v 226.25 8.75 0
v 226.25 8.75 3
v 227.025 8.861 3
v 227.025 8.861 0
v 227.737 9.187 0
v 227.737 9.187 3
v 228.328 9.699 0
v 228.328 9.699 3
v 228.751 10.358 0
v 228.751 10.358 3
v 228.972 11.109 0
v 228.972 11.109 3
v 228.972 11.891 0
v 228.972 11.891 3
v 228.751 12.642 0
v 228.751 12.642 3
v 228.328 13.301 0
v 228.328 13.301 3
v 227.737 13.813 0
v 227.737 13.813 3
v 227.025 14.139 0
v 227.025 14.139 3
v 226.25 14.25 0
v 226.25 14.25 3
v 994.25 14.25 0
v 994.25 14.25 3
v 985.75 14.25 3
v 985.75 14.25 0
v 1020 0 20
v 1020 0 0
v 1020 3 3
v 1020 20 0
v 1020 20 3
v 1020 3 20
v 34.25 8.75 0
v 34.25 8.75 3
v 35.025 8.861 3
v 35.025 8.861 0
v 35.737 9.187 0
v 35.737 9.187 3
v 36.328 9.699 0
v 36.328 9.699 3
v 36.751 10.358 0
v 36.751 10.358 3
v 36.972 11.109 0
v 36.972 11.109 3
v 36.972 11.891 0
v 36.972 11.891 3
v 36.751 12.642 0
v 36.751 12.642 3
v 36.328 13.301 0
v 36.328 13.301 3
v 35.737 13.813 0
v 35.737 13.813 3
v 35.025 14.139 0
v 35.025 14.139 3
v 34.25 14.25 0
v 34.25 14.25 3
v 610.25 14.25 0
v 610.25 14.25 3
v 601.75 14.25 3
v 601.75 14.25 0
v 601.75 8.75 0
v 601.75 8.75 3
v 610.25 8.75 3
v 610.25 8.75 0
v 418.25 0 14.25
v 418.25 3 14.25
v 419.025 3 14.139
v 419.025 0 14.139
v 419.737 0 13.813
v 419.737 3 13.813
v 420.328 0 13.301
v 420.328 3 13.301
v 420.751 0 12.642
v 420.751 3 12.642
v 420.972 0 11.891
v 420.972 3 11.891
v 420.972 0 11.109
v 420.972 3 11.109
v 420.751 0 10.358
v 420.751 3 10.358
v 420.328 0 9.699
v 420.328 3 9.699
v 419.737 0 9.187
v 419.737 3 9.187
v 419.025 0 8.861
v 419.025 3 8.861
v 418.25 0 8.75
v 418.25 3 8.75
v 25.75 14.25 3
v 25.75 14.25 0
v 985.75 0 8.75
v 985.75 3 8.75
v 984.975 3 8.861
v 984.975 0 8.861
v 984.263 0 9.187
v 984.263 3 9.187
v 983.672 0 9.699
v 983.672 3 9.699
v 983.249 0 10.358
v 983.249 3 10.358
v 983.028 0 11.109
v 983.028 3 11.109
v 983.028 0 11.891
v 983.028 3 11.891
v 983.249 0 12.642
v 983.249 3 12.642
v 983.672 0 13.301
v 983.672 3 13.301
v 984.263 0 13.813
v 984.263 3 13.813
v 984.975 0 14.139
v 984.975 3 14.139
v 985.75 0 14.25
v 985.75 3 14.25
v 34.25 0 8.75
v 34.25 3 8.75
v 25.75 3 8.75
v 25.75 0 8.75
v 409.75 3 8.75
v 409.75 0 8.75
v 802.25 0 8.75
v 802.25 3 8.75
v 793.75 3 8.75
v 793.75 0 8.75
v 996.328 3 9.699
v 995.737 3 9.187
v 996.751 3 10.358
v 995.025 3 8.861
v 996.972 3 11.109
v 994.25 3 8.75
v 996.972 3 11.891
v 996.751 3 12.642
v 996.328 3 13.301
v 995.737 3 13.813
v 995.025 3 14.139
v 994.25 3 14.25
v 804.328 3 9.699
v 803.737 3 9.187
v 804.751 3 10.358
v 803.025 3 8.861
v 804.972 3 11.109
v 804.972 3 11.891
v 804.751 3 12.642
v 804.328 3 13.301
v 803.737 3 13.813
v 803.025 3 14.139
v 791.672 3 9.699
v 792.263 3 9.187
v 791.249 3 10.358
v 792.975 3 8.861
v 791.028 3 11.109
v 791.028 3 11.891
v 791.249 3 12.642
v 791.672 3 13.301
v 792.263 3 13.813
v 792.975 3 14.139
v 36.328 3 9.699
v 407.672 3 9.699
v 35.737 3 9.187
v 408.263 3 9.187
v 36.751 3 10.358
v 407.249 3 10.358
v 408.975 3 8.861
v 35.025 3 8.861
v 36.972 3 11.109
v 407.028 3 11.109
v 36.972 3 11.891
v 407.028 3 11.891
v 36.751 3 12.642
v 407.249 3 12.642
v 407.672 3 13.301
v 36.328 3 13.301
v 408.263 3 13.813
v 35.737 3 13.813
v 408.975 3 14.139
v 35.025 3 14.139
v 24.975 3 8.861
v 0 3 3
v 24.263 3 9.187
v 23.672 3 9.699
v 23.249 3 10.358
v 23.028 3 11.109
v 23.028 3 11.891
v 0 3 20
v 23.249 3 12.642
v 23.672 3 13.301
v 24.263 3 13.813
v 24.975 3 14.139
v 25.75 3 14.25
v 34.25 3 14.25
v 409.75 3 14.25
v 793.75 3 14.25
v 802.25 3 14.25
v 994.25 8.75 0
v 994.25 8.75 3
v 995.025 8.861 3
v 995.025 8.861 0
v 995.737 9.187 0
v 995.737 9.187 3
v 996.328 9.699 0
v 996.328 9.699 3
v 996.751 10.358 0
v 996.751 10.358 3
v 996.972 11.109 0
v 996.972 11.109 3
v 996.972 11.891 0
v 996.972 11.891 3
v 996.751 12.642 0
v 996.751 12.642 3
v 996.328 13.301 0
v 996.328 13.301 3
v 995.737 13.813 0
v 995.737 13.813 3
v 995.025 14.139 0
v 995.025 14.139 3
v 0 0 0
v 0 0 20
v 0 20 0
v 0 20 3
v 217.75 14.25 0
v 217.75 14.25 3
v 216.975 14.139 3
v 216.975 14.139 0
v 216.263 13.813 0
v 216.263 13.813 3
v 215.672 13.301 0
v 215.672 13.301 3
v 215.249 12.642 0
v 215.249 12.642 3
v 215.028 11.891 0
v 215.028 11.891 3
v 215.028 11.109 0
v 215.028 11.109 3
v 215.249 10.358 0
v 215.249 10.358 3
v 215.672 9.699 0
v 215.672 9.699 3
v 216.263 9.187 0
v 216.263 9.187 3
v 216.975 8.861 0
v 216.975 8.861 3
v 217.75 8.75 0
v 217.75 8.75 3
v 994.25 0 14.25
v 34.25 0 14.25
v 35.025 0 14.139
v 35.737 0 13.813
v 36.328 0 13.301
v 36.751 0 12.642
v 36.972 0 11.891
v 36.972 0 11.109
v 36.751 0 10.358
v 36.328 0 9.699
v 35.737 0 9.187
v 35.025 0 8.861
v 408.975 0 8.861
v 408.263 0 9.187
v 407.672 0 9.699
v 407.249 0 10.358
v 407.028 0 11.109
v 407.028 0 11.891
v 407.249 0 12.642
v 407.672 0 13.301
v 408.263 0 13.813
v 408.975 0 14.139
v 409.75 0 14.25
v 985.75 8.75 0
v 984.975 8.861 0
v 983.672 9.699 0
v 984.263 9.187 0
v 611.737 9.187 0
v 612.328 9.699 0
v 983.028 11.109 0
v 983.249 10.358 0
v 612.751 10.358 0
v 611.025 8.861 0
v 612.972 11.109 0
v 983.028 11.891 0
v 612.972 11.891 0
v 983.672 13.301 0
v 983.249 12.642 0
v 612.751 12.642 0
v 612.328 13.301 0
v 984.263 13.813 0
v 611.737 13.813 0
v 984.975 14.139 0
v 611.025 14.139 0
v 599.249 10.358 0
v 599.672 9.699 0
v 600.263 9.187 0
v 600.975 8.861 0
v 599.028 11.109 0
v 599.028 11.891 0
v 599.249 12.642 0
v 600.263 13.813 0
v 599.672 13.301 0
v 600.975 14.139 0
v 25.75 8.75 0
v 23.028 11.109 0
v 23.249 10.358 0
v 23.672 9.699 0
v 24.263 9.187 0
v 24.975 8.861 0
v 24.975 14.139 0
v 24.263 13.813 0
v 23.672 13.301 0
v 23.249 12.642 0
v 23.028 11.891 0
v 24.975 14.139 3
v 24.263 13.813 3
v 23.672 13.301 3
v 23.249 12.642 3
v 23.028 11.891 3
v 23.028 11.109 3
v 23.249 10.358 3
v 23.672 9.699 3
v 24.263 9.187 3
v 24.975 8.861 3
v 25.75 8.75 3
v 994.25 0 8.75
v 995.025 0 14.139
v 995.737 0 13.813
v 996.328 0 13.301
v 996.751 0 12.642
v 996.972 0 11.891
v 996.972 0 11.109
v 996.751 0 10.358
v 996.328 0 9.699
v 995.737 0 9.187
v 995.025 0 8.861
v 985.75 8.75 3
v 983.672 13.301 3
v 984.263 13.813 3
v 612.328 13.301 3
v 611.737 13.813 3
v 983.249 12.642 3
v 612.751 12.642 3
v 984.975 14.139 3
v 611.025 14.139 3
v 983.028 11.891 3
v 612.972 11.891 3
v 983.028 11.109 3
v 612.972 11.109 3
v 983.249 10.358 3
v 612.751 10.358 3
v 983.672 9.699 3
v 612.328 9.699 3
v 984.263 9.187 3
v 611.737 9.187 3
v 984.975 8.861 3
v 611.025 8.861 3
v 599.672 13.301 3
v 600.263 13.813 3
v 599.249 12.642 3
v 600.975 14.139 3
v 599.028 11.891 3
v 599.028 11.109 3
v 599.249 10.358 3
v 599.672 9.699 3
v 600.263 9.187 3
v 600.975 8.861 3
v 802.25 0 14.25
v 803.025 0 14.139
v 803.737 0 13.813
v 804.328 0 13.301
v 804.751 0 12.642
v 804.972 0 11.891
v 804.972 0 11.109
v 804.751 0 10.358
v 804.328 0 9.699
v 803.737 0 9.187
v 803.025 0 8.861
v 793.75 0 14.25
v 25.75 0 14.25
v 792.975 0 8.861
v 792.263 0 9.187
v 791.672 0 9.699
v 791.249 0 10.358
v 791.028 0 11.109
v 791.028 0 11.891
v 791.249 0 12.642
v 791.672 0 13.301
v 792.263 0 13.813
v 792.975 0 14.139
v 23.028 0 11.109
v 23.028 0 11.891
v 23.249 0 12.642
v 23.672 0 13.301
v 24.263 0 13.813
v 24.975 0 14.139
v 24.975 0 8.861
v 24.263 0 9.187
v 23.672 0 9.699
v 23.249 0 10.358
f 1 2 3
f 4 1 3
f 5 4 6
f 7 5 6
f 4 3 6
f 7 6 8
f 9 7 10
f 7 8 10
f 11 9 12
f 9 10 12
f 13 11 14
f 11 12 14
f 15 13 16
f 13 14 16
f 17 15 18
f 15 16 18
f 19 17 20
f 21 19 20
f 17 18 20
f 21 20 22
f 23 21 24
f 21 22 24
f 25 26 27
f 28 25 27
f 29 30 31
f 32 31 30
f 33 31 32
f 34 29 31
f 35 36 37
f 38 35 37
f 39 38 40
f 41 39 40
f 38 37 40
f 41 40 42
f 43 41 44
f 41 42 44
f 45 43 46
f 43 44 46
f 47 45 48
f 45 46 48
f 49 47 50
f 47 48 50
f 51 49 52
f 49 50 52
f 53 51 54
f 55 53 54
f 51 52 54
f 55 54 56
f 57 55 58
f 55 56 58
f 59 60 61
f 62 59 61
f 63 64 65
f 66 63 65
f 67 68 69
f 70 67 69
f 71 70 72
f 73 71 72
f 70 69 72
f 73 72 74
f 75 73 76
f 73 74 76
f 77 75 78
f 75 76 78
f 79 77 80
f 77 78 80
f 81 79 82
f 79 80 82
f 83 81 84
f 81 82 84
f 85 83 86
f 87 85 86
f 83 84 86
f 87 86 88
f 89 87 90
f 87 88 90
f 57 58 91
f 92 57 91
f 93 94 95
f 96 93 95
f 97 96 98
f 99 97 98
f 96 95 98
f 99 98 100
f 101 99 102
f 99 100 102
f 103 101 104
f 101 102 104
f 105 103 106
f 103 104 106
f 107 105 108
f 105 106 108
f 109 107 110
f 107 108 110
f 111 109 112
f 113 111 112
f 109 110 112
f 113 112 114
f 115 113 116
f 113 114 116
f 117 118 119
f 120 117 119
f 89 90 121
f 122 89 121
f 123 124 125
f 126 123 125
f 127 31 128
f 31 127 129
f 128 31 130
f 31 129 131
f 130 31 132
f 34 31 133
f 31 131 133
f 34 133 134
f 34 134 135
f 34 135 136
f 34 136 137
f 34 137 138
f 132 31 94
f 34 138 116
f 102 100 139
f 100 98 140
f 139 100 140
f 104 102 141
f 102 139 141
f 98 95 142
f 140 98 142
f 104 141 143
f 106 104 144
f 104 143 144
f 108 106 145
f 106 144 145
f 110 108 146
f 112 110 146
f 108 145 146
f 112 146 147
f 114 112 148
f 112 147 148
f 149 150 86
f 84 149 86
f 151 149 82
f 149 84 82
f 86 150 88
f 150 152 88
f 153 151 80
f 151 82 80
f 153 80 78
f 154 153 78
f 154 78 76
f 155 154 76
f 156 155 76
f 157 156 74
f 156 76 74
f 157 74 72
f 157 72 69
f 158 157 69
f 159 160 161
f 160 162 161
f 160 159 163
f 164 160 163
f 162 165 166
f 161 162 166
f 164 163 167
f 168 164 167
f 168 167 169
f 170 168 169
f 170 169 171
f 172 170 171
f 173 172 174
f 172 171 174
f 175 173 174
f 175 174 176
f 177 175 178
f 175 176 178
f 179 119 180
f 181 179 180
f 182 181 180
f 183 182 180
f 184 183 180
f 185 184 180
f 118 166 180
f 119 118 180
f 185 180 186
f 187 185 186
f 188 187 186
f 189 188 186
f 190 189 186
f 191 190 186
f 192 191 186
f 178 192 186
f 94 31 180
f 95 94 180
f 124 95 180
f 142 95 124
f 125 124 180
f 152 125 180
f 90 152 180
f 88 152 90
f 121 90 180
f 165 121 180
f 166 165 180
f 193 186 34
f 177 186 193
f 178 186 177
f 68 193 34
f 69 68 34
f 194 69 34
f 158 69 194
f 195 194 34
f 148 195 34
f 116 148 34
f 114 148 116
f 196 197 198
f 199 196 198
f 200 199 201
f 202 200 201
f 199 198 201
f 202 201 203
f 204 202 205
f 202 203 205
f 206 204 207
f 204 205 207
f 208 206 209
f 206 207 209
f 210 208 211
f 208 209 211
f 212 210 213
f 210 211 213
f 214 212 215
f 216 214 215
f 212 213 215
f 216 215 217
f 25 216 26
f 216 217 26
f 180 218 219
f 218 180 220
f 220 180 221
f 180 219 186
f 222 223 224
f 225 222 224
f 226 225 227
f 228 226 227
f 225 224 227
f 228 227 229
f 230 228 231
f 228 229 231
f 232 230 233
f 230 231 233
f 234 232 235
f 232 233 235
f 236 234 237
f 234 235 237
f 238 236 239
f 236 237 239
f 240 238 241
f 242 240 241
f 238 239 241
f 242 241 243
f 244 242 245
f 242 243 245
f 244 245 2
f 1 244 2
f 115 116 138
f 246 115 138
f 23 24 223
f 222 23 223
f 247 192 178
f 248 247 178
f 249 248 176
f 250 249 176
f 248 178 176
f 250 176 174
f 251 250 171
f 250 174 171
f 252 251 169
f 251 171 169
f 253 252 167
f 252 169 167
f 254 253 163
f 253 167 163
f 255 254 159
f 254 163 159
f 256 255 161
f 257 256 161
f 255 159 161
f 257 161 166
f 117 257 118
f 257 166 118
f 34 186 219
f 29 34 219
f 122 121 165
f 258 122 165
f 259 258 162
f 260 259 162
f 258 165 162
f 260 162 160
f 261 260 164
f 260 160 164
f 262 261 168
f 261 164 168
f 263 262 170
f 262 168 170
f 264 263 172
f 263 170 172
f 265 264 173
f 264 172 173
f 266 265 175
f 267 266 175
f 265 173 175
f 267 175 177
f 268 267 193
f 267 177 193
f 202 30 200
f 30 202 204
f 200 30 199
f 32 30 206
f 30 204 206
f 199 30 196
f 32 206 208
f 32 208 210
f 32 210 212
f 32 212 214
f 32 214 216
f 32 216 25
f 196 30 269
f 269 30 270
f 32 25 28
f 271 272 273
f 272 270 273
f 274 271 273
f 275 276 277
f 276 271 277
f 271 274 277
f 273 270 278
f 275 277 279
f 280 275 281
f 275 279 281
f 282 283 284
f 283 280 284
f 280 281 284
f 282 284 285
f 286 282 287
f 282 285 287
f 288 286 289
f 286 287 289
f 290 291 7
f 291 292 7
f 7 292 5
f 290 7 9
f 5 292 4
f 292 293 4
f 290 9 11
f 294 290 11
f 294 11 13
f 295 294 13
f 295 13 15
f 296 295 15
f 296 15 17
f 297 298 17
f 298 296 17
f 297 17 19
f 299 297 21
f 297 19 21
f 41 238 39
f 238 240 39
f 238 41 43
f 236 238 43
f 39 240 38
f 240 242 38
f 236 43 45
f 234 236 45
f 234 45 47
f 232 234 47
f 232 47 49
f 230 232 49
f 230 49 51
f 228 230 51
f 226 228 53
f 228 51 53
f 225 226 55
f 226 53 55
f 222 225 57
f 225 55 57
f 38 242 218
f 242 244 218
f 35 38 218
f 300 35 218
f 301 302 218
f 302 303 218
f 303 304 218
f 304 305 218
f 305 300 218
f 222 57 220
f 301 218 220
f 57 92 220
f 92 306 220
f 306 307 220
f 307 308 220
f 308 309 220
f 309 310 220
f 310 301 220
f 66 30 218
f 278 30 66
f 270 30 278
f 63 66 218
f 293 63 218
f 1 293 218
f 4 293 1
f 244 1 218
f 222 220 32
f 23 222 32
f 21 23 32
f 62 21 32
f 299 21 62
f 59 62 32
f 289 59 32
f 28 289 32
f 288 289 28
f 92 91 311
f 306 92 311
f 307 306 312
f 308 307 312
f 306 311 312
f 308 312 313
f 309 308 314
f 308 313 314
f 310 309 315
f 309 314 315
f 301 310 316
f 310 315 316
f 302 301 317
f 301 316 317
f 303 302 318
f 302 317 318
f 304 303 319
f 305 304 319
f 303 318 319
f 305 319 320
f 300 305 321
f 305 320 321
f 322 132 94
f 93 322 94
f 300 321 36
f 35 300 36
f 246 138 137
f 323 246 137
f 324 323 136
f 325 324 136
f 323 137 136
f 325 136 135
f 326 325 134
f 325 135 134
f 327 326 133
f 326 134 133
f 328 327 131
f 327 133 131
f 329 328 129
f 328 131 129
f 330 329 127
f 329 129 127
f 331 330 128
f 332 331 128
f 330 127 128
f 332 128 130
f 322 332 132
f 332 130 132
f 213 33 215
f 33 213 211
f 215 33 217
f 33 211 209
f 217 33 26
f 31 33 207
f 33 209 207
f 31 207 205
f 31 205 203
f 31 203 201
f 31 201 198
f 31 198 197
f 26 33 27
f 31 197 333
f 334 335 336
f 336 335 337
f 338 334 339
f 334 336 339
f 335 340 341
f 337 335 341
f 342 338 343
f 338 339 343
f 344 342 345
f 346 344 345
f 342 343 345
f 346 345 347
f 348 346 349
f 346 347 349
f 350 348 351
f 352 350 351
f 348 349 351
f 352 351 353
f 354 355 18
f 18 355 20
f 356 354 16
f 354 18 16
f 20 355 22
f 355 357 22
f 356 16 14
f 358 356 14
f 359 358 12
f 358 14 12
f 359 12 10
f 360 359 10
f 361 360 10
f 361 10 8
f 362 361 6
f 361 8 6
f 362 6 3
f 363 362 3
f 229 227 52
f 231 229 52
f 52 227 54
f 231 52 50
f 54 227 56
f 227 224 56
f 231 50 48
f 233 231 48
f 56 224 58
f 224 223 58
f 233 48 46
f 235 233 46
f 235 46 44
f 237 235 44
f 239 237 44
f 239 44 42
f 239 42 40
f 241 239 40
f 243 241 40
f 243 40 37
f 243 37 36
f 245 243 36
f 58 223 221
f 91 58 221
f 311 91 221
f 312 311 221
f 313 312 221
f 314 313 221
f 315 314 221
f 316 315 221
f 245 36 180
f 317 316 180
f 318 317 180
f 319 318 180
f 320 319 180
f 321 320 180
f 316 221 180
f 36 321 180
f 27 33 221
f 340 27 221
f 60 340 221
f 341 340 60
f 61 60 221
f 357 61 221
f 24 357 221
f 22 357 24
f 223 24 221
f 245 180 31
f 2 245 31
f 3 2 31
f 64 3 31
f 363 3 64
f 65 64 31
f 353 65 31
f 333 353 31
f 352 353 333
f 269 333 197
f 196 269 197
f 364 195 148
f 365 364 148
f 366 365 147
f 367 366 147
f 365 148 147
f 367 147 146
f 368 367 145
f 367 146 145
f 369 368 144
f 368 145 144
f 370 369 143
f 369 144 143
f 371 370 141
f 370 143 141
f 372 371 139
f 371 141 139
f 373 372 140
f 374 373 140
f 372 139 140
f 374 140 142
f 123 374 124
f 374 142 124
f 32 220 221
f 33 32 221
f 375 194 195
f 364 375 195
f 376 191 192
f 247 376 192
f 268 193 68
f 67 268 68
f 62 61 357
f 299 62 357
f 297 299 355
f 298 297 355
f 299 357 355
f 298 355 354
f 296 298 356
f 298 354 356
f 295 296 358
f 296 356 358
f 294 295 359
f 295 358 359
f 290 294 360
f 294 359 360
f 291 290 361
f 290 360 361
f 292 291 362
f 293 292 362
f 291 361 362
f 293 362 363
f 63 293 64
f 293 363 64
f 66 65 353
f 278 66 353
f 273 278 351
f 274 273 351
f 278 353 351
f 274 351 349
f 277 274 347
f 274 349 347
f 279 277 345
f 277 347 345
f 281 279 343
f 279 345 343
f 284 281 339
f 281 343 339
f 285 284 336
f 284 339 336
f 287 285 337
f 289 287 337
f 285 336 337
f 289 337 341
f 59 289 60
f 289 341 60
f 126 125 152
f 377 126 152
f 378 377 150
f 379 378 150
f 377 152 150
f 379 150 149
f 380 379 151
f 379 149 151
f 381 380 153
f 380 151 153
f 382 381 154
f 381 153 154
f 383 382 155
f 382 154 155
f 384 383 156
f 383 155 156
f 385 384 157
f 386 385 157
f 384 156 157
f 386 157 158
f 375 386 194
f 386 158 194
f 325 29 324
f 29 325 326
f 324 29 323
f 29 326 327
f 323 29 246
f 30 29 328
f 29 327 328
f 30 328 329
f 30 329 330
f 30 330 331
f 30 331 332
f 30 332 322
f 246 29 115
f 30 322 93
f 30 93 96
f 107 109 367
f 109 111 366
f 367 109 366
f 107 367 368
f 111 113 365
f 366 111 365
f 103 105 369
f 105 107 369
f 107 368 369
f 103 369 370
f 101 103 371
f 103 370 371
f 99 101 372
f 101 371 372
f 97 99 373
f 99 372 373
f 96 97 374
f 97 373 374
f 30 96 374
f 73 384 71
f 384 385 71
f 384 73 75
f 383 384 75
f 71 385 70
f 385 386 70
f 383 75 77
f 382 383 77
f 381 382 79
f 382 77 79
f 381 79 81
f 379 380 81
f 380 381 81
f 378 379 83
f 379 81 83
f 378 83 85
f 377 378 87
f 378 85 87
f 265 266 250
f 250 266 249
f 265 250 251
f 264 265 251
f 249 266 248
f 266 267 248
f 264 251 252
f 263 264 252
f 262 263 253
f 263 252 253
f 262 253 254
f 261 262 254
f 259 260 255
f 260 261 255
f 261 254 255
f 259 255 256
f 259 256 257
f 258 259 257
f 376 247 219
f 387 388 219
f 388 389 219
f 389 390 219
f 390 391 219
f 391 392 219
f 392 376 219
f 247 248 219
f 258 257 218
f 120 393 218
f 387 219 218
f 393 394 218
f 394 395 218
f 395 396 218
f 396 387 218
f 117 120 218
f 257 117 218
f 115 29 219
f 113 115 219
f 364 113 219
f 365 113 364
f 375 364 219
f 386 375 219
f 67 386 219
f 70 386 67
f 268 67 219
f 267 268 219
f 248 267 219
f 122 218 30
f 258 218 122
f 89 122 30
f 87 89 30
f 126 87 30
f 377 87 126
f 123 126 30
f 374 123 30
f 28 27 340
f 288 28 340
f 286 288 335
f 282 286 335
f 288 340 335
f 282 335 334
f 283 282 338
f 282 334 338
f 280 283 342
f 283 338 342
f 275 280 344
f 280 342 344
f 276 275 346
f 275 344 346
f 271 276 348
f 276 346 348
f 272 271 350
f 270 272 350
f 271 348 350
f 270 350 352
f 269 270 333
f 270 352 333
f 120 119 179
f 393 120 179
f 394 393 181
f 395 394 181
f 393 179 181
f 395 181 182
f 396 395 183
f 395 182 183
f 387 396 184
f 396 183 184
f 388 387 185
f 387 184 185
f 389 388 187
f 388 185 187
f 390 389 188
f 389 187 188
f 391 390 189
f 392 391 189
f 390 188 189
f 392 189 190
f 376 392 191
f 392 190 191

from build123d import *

# Parameters (mm, degrees)
F1_DEPTH = 1020
F3_DEPTH = 3
F5_DEPTH = 3


with BuildPart() as f1:
    # F0 (on Right) → F1 (new body)
    with BuildSketch(Plane.YZ):
        Polygon((0, 20), (0, 0), (20, 0), (20, 3), (3, 3), (3, 20), align=None)
    extrude(amount=F1_DEPTH)

    # F2 (on face) → F3 (cut)
    with BuildSketch(Plane(origin=(0, 3, 0), x_dir=(-1, 0, 0), z_dir=(0, 1, 0))):
        with BuildLine():
            Line((-985.75, 14.25), (-994.25, 14.25))
            ThreePointArc((-994.25, 14.25), (-997, 11.5), (-994.25, 8.75))
            Line((-994.25, 8.75), (-985.75, 8.75))
            ThreePointArc((-985.75, 8.75), (-983, 11.5), (-985.75, 14.25))
        make_face()
        with BuildLine():
            Line((-25.75, 14.25), (-34.25, 14.25))
            ThreePointArc((-34.25, 14.25), (-37, 11.5), (-34.25, 8.75))
            Line((-34.25, 8.75), (-25.75, 8.75))
            ThreePointArc((-25.75, 8.75), (-23, 11.5), (-25.75, 14.25))
        make_face()
        with BuildLine():
            Line((-793.75, 14.25), (-802.25, 14.25))
            ThreePointArc((-802.25, 14.25), (-805, 11.5), (-802.25, 8.75))
            Line((-802.25, 8.75), (-793.75, 8.75))
            ThreePointArc((-793.75, 8.75), (-791, 11.5), (-793.75, 14.25))
        make_face()
        with BuildLine():
            Line((-409.75, 14.25), (-418.25, 14.25))
            ThreePointArc((-418.25, 14.25), (-421, 11.5), (-418.25, 8.75))
            Line((-418.25, 8.75), (-409.75, 8.75))
            ThreePointArc((-409.75, 8.75), (-407, 11.5), (-409.75, 14.25))
        make_face()
    extrude(amount=-F3_DEPTH, mode=Mode.SUBTRACT)

    # F4 (on face) → F5 (cut)
    with BuildSketch(Plane.XY.offset(3)):
        with BuildLine():
            Line((994.25, 14.25), (985.75, 14.25))
            ThreePointArc((985.75, 14.25), (983, 11.5), (985.75, 8.75))
            Line((985.75, 8.75), (994.25, 8.75))
            ThreePointArc((994.25, 8.75), (997, 11.5), (994.25, 14.25))
        make_face()
        with BuildLine():
            Line((226.25, 14.25), (217.75, 14.25))
            ThreePointArc((217.75, 14.25), (215, 11.5), (217.75, 8.75))
            Line((217.75, 8.75), (226.25, 8.75))
            ThreePointArc((226.25, 8.75), (229, 11.5), (226.25, 14.25))
        make_face()
        with BuildLine():
            Line((34.25, 14.25), (25.75, 14.25))
            ThreePointArc((25.75, 14.25), (23, 11.5), (25.75, 8.75))
            Line((25.75, 8.75), (34.25, 8.75))
            ThreePointArc((34.25, 8.75), (37, 11.5), (34.25, 14.25))
        make_face()
        with BuildLine():
            Line((610.25, 14.25), (601.75, 14.25))
            ThreePointArc((601.75, 14.25), (599, 11.5), (601.75, 8.75))
            Line((601.75, 8.75), (610.25, 8.75))
            ThreePointArc((610.25, 8.75), (613, 11.5), (610.25, 14.25))
        make_face()
    extrude(amount=-F5_DEPTH, mode=Mode.SUBTRACT)


solid = f1.part
